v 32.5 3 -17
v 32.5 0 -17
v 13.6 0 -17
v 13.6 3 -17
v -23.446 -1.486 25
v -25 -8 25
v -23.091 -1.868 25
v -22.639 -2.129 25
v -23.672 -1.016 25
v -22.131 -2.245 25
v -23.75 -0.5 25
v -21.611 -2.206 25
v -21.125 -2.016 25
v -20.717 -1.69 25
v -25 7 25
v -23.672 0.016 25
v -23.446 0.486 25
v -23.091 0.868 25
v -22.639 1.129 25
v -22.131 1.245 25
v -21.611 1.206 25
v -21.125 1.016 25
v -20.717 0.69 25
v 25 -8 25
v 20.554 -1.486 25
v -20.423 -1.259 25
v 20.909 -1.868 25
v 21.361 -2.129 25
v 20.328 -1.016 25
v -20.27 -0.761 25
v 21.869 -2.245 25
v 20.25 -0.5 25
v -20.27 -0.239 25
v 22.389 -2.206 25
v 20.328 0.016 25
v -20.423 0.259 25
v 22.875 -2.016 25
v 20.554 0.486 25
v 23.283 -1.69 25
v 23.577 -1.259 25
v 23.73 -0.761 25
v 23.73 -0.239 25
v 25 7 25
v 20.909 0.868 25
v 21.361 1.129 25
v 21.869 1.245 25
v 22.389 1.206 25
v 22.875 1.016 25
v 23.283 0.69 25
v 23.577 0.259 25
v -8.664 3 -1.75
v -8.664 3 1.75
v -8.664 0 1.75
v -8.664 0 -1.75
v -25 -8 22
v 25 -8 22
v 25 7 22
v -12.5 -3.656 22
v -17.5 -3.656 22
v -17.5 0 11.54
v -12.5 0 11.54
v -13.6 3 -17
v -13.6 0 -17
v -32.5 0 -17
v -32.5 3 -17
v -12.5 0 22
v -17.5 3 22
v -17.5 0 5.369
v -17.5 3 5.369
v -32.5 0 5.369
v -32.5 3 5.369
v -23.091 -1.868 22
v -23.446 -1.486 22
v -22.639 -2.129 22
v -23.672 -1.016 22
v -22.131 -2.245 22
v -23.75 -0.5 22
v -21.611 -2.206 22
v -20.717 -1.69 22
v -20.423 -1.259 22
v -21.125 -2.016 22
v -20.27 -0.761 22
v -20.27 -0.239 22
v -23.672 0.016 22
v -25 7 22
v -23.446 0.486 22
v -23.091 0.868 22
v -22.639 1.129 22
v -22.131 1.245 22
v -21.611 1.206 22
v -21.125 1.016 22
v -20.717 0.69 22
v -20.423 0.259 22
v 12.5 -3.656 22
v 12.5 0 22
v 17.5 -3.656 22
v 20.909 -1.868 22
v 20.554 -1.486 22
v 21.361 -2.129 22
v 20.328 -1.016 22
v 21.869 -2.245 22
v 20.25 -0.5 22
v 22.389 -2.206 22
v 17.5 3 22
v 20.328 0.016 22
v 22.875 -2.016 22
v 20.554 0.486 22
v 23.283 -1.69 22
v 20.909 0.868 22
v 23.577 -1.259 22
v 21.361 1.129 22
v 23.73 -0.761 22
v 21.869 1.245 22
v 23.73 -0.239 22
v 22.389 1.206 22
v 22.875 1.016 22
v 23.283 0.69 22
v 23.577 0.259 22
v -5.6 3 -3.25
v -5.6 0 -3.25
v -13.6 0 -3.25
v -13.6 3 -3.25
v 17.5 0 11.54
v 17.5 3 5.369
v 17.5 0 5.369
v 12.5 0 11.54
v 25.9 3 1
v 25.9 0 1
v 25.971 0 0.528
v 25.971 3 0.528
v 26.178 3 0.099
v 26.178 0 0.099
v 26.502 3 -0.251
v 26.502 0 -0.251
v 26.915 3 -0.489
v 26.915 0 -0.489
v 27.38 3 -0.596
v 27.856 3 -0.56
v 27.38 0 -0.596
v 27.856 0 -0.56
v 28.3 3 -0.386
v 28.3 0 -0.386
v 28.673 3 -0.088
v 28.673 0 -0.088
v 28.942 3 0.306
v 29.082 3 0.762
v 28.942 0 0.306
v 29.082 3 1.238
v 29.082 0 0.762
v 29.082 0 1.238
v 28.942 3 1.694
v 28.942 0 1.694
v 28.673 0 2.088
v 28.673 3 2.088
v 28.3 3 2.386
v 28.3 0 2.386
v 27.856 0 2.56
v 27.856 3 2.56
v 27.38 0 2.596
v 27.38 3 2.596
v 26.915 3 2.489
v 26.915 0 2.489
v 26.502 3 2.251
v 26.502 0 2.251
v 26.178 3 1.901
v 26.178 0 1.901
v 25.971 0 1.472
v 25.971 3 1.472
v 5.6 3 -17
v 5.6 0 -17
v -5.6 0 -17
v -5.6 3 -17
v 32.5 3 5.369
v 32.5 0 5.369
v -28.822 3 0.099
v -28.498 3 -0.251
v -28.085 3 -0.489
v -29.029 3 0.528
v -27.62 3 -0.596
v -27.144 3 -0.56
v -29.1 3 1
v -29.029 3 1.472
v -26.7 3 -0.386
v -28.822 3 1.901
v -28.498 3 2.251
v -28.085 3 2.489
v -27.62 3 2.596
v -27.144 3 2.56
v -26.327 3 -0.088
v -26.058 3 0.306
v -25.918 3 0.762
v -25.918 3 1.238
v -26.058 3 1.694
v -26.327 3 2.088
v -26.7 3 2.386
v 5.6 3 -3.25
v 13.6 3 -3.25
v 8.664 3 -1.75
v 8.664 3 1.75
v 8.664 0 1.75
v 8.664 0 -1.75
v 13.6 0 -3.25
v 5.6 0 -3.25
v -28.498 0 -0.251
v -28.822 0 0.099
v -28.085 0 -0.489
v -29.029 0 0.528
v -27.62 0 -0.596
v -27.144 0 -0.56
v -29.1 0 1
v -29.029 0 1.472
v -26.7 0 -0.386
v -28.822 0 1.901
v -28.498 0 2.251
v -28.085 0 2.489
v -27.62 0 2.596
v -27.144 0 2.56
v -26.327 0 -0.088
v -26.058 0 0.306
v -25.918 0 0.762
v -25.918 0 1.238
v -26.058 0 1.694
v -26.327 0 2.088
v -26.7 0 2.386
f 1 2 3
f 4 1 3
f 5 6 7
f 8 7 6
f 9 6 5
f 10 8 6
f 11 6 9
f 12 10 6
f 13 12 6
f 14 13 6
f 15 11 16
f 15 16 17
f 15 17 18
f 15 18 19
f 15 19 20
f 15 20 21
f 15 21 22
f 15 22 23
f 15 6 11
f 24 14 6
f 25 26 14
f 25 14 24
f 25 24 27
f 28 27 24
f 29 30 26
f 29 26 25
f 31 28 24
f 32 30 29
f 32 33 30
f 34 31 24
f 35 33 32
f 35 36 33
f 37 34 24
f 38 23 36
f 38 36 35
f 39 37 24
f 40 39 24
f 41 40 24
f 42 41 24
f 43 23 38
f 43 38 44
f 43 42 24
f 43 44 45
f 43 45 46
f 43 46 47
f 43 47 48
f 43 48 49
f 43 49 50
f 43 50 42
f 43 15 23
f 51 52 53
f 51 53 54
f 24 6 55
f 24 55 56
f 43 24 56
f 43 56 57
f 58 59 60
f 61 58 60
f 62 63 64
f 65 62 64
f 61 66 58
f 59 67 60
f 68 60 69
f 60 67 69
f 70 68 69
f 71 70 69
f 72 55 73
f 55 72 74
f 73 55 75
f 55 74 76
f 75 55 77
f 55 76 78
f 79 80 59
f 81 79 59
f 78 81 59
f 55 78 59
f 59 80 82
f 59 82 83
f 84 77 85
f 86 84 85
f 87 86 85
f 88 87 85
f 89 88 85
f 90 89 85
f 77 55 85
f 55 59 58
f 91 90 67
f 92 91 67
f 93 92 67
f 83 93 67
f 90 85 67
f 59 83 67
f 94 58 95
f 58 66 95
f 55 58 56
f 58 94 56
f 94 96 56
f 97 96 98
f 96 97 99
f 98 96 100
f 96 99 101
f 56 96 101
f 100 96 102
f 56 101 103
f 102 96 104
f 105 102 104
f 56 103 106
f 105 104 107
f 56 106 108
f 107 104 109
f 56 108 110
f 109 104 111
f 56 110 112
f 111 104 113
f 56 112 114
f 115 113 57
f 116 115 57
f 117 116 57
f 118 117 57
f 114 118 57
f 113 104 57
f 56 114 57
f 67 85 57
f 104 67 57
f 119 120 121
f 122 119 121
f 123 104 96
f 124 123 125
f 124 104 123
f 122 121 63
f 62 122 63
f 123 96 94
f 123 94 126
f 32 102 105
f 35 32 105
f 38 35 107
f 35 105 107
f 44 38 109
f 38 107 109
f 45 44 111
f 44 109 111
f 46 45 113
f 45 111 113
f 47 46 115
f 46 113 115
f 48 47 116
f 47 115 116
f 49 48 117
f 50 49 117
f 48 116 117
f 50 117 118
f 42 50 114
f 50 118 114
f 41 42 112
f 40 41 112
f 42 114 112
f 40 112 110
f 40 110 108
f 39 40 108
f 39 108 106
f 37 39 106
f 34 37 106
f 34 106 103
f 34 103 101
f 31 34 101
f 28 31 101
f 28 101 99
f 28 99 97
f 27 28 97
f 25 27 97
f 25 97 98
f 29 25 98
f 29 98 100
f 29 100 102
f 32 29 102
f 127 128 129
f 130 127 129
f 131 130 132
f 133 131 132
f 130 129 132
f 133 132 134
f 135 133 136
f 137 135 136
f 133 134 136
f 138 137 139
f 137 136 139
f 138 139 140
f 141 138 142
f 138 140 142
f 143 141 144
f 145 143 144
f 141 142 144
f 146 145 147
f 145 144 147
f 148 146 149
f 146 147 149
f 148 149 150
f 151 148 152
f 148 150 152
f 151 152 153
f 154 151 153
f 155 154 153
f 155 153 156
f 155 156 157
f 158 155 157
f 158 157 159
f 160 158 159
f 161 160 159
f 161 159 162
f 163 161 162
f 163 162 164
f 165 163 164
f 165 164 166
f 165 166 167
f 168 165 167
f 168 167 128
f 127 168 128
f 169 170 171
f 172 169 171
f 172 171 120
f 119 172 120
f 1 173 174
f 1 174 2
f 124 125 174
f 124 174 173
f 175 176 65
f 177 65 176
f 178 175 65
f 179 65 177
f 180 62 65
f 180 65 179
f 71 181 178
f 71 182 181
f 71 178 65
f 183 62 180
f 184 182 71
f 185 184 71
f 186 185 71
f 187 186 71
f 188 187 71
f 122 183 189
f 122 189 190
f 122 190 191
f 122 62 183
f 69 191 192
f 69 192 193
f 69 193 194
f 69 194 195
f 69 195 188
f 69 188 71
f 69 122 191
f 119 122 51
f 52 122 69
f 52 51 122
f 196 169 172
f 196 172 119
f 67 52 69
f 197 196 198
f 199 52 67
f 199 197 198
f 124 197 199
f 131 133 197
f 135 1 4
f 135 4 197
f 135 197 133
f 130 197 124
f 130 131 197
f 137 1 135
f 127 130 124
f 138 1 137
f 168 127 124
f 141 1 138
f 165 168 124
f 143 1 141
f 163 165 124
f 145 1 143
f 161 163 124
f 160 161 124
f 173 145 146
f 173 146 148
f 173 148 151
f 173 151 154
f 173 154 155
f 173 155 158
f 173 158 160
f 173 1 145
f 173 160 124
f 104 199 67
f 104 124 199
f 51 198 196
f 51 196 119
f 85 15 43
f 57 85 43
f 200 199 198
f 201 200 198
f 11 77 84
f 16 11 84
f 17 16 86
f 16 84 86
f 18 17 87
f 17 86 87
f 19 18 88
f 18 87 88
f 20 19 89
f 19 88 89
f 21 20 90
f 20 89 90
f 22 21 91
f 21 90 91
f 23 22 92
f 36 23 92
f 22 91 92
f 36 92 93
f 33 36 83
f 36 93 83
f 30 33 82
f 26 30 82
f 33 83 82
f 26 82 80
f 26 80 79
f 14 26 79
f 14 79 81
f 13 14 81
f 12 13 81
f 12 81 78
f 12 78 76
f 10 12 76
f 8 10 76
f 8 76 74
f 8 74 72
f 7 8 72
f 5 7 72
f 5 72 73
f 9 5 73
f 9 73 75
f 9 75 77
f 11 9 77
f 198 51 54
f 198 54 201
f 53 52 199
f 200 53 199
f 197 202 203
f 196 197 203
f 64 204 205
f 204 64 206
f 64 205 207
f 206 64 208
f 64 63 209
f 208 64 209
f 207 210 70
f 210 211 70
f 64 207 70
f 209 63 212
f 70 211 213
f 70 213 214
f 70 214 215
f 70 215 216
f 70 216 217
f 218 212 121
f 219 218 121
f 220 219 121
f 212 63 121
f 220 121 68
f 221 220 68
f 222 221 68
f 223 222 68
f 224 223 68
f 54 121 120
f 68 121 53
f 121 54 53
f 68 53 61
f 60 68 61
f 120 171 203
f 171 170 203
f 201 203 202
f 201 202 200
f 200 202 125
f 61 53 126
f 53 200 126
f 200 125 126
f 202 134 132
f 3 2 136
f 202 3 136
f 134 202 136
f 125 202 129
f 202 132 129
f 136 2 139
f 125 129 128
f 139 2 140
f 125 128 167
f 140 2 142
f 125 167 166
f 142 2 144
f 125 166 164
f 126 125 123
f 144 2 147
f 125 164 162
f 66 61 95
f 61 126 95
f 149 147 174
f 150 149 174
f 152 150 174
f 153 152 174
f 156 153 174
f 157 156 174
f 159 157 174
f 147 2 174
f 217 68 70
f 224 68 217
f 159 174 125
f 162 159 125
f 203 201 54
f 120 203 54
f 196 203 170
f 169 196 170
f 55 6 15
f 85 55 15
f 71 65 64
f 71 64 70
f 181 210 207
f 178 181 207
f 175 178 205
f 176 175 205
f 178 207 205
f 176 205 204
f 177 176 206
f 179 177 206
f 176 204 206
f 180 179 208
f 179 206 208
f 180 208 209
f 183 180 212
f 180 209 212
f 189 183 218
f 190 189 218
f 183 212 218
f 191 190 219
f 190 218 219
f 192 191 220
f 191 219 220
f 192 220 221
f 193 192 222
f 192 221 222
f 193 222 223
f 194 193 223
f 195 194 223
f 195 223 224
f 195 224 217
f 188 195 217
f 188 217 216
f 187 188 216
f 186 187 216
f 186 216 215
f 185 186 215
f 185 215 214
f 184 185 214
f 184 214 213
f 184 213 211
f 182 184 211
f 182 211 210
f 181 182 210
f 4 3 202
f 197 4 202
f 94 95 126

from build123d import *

# Parameters (mm, degrees)
SKETCH1_W                      = 50
SKETCH1_H                      = 15
BOSS_EXTRUDE1_DEPTH            = 3
SKETCH2_W                      = 35
SKETCH2_H                      = 3
BOSS_EXTRUDE2_DEPTH            = 47
SKETCH3_W                      = 30.36922738
SKETCH3_H                      = 3
BOSS_EXTRUDE3_DEPTH            = 15
SKETCH4_W                      = 30.36922738
SKETCH4_H                      = 3
BOSS_EXTRUDE4_DEPTH            = 15
CUT_EXTRUDE1_DEPTH             = 42.776189391
F_4_0_4_DIAMETER_HOLE1_D       = 3.5
F_4_0_4_DIAMETER_HOLE1_DEPTH   = 3
F_3_2_3_2_DIAMETER_HOLE1_D     = 3.2
F_3_2_3_2_DIAMETER_HOLE1_DEPTH = 11
CUT_EXTRUDE2_START             = -15
SKETCH14_W                     = 8
SKETCH14_H                     = 3
CUT_EXTRUDE2_DEPTH             = 72.471231614
SKETCH15_W                     = 17.327316674
SKETCH15_H                     = 3.5
CUT_EXTRUDE3_DEPTH             = 10
BOSS_EXTRUDE5_DEPTH            = 5


with BuildPart() as part:
    # Sketch1 → Boss-Extrude1 (new body)
    with BuildSketch(Plane.XY.offset(25)):
        with Locations((0, -0.5)):
            Rectangle(SKETCH1_W, SKETCH1_H)
    extrude(amount=-BOSS_EXTRUDE1_DEPTH)

    # Sketch2 → Boss-Extrude2 (add)
    with BuildSketch(Plane(origin=(0, 0, 22), x_dir=(-1, 0, 0), z_dir=(0, 0, -1))):
        with Locations((0, 1.5)):
            Rectangle(SKETCH2_W, SKETCH2_H)
    extrude(amount=BOSS_EXTRUDE2_DEPTH)

    # Sketch3 → Boss-Extrude3 (add)
    with BuildSketch(Plane(origin=(17.5, 0, 0), x_dir=(0, 0, -1), z_dir=(1, 0, 0))):
        with Locations((9.81538631, 1.5)):
            Rectangle(SKETCH3_W, SKETCH3_H)
    extrude(amount=BOSS_EXTRUDE3_DEPTH)

    # Sketch4 → Boss-Extrude4 (add)
    with BuildSketch(Plane.ZY.offset(17.5)):
        with Locations((-9.81538631, 1.5)):
            Rectangle(SKETCH4_W, SKETCH4_H)
    extrude(amount=BOSS_EXTRUDE4_DEPTH)

    # Sketch5 → Cut-Extrude1 (cut, through all)
    with BuildSketch(Plane.XZ):
        Polygon((17.5, -25), (17.5, -17), (13.6, -17), (13.6, -3.25), (5.6, -3.25), (5.6, -17), (-5.6, -17), (-5.6, -3.25), (-13.6, -3.25), (-13.6, -17), (-17.5, -17), (-17.5, -25), align=None)
    extrude(amount=-CUT_EXTRUDE1_DEPTH, mode=Mode.SUBTRACT)

    # Ø4.0 (4) Diameter Hole1
    with Locations(Plane.XY.offset(25)):
        with Locations((22, -0.5), (-22, -0.5)):
            Hole(F_4_0_4_DIAMETER_HOLE1_D / 2, depth=F_4_0_4_DIAMETER_HOLE1_DEPTH)

    # Ø3.2 (3.2) Diameter Hole1
    with Locations(Plane(origin=(0, 3, 0), x_dir=(1, 0, 0), z_dir=(0, 1, 0))):
        with Locations((-27.5, -1), (27.5, -1)):
            Hole(F_3_2_3_2_DIAMETER_HOLE1_D / 2, depth=F_3_2_3_2_DIAMETER_HOLE1_DEPTH)

    # Sketch14 → Cut-Extrude2 (cut, through all)
    with BuildSketch(Plane(origin=(-17.5, 0, 0), x_dir=(0, 0, -1), z_dir=(1, 0, 0)).offset(CUT_EXTRUDE2_START)):
        with Locations((21, 1.5)):
            Rectangle(SKETCH14_W, SKETCH14_H)
    extrude(amount=CUT_EXTRUDE2_DEPTH, mode=Mode.SUBTRACT)

    # Sketch15 → Cut-Extrude3 (cut)
    with BuildSketch(Plane(origin=(0, 3, 0), x_dir=(1, 0, 0), z_dir=(0, 1, 0))):
        Rectangle(SKETCH15_W, SKETCH15_H)
    extrude(amount=-CUT_EXTRUDE3_DEPTH, mode=Mode.SUBTRACT)

    # Sketch17 → Boss-Extrude5 (add)
    with BuildSketch(Plane(origin=(17.5, 0, 0), x_dir=(0, 0, -1), z_dir=(1, 0, 0))):
        Polygon((-22, -3.655953394), (-11.540106588, 0), (-22, 0), align=None)
    boss_extrude5 = extrude(amount=-BOSS_EXTRUDE5_DEPTH)

    # Mirror1: Boss-Extrude5 across plane
    add(boss_extrude5.mirror(Plane(origin=(0, 0, 0), x_dir=(0, 0, 1), z_dir=(1, 0, 0))))


solid = part.part
